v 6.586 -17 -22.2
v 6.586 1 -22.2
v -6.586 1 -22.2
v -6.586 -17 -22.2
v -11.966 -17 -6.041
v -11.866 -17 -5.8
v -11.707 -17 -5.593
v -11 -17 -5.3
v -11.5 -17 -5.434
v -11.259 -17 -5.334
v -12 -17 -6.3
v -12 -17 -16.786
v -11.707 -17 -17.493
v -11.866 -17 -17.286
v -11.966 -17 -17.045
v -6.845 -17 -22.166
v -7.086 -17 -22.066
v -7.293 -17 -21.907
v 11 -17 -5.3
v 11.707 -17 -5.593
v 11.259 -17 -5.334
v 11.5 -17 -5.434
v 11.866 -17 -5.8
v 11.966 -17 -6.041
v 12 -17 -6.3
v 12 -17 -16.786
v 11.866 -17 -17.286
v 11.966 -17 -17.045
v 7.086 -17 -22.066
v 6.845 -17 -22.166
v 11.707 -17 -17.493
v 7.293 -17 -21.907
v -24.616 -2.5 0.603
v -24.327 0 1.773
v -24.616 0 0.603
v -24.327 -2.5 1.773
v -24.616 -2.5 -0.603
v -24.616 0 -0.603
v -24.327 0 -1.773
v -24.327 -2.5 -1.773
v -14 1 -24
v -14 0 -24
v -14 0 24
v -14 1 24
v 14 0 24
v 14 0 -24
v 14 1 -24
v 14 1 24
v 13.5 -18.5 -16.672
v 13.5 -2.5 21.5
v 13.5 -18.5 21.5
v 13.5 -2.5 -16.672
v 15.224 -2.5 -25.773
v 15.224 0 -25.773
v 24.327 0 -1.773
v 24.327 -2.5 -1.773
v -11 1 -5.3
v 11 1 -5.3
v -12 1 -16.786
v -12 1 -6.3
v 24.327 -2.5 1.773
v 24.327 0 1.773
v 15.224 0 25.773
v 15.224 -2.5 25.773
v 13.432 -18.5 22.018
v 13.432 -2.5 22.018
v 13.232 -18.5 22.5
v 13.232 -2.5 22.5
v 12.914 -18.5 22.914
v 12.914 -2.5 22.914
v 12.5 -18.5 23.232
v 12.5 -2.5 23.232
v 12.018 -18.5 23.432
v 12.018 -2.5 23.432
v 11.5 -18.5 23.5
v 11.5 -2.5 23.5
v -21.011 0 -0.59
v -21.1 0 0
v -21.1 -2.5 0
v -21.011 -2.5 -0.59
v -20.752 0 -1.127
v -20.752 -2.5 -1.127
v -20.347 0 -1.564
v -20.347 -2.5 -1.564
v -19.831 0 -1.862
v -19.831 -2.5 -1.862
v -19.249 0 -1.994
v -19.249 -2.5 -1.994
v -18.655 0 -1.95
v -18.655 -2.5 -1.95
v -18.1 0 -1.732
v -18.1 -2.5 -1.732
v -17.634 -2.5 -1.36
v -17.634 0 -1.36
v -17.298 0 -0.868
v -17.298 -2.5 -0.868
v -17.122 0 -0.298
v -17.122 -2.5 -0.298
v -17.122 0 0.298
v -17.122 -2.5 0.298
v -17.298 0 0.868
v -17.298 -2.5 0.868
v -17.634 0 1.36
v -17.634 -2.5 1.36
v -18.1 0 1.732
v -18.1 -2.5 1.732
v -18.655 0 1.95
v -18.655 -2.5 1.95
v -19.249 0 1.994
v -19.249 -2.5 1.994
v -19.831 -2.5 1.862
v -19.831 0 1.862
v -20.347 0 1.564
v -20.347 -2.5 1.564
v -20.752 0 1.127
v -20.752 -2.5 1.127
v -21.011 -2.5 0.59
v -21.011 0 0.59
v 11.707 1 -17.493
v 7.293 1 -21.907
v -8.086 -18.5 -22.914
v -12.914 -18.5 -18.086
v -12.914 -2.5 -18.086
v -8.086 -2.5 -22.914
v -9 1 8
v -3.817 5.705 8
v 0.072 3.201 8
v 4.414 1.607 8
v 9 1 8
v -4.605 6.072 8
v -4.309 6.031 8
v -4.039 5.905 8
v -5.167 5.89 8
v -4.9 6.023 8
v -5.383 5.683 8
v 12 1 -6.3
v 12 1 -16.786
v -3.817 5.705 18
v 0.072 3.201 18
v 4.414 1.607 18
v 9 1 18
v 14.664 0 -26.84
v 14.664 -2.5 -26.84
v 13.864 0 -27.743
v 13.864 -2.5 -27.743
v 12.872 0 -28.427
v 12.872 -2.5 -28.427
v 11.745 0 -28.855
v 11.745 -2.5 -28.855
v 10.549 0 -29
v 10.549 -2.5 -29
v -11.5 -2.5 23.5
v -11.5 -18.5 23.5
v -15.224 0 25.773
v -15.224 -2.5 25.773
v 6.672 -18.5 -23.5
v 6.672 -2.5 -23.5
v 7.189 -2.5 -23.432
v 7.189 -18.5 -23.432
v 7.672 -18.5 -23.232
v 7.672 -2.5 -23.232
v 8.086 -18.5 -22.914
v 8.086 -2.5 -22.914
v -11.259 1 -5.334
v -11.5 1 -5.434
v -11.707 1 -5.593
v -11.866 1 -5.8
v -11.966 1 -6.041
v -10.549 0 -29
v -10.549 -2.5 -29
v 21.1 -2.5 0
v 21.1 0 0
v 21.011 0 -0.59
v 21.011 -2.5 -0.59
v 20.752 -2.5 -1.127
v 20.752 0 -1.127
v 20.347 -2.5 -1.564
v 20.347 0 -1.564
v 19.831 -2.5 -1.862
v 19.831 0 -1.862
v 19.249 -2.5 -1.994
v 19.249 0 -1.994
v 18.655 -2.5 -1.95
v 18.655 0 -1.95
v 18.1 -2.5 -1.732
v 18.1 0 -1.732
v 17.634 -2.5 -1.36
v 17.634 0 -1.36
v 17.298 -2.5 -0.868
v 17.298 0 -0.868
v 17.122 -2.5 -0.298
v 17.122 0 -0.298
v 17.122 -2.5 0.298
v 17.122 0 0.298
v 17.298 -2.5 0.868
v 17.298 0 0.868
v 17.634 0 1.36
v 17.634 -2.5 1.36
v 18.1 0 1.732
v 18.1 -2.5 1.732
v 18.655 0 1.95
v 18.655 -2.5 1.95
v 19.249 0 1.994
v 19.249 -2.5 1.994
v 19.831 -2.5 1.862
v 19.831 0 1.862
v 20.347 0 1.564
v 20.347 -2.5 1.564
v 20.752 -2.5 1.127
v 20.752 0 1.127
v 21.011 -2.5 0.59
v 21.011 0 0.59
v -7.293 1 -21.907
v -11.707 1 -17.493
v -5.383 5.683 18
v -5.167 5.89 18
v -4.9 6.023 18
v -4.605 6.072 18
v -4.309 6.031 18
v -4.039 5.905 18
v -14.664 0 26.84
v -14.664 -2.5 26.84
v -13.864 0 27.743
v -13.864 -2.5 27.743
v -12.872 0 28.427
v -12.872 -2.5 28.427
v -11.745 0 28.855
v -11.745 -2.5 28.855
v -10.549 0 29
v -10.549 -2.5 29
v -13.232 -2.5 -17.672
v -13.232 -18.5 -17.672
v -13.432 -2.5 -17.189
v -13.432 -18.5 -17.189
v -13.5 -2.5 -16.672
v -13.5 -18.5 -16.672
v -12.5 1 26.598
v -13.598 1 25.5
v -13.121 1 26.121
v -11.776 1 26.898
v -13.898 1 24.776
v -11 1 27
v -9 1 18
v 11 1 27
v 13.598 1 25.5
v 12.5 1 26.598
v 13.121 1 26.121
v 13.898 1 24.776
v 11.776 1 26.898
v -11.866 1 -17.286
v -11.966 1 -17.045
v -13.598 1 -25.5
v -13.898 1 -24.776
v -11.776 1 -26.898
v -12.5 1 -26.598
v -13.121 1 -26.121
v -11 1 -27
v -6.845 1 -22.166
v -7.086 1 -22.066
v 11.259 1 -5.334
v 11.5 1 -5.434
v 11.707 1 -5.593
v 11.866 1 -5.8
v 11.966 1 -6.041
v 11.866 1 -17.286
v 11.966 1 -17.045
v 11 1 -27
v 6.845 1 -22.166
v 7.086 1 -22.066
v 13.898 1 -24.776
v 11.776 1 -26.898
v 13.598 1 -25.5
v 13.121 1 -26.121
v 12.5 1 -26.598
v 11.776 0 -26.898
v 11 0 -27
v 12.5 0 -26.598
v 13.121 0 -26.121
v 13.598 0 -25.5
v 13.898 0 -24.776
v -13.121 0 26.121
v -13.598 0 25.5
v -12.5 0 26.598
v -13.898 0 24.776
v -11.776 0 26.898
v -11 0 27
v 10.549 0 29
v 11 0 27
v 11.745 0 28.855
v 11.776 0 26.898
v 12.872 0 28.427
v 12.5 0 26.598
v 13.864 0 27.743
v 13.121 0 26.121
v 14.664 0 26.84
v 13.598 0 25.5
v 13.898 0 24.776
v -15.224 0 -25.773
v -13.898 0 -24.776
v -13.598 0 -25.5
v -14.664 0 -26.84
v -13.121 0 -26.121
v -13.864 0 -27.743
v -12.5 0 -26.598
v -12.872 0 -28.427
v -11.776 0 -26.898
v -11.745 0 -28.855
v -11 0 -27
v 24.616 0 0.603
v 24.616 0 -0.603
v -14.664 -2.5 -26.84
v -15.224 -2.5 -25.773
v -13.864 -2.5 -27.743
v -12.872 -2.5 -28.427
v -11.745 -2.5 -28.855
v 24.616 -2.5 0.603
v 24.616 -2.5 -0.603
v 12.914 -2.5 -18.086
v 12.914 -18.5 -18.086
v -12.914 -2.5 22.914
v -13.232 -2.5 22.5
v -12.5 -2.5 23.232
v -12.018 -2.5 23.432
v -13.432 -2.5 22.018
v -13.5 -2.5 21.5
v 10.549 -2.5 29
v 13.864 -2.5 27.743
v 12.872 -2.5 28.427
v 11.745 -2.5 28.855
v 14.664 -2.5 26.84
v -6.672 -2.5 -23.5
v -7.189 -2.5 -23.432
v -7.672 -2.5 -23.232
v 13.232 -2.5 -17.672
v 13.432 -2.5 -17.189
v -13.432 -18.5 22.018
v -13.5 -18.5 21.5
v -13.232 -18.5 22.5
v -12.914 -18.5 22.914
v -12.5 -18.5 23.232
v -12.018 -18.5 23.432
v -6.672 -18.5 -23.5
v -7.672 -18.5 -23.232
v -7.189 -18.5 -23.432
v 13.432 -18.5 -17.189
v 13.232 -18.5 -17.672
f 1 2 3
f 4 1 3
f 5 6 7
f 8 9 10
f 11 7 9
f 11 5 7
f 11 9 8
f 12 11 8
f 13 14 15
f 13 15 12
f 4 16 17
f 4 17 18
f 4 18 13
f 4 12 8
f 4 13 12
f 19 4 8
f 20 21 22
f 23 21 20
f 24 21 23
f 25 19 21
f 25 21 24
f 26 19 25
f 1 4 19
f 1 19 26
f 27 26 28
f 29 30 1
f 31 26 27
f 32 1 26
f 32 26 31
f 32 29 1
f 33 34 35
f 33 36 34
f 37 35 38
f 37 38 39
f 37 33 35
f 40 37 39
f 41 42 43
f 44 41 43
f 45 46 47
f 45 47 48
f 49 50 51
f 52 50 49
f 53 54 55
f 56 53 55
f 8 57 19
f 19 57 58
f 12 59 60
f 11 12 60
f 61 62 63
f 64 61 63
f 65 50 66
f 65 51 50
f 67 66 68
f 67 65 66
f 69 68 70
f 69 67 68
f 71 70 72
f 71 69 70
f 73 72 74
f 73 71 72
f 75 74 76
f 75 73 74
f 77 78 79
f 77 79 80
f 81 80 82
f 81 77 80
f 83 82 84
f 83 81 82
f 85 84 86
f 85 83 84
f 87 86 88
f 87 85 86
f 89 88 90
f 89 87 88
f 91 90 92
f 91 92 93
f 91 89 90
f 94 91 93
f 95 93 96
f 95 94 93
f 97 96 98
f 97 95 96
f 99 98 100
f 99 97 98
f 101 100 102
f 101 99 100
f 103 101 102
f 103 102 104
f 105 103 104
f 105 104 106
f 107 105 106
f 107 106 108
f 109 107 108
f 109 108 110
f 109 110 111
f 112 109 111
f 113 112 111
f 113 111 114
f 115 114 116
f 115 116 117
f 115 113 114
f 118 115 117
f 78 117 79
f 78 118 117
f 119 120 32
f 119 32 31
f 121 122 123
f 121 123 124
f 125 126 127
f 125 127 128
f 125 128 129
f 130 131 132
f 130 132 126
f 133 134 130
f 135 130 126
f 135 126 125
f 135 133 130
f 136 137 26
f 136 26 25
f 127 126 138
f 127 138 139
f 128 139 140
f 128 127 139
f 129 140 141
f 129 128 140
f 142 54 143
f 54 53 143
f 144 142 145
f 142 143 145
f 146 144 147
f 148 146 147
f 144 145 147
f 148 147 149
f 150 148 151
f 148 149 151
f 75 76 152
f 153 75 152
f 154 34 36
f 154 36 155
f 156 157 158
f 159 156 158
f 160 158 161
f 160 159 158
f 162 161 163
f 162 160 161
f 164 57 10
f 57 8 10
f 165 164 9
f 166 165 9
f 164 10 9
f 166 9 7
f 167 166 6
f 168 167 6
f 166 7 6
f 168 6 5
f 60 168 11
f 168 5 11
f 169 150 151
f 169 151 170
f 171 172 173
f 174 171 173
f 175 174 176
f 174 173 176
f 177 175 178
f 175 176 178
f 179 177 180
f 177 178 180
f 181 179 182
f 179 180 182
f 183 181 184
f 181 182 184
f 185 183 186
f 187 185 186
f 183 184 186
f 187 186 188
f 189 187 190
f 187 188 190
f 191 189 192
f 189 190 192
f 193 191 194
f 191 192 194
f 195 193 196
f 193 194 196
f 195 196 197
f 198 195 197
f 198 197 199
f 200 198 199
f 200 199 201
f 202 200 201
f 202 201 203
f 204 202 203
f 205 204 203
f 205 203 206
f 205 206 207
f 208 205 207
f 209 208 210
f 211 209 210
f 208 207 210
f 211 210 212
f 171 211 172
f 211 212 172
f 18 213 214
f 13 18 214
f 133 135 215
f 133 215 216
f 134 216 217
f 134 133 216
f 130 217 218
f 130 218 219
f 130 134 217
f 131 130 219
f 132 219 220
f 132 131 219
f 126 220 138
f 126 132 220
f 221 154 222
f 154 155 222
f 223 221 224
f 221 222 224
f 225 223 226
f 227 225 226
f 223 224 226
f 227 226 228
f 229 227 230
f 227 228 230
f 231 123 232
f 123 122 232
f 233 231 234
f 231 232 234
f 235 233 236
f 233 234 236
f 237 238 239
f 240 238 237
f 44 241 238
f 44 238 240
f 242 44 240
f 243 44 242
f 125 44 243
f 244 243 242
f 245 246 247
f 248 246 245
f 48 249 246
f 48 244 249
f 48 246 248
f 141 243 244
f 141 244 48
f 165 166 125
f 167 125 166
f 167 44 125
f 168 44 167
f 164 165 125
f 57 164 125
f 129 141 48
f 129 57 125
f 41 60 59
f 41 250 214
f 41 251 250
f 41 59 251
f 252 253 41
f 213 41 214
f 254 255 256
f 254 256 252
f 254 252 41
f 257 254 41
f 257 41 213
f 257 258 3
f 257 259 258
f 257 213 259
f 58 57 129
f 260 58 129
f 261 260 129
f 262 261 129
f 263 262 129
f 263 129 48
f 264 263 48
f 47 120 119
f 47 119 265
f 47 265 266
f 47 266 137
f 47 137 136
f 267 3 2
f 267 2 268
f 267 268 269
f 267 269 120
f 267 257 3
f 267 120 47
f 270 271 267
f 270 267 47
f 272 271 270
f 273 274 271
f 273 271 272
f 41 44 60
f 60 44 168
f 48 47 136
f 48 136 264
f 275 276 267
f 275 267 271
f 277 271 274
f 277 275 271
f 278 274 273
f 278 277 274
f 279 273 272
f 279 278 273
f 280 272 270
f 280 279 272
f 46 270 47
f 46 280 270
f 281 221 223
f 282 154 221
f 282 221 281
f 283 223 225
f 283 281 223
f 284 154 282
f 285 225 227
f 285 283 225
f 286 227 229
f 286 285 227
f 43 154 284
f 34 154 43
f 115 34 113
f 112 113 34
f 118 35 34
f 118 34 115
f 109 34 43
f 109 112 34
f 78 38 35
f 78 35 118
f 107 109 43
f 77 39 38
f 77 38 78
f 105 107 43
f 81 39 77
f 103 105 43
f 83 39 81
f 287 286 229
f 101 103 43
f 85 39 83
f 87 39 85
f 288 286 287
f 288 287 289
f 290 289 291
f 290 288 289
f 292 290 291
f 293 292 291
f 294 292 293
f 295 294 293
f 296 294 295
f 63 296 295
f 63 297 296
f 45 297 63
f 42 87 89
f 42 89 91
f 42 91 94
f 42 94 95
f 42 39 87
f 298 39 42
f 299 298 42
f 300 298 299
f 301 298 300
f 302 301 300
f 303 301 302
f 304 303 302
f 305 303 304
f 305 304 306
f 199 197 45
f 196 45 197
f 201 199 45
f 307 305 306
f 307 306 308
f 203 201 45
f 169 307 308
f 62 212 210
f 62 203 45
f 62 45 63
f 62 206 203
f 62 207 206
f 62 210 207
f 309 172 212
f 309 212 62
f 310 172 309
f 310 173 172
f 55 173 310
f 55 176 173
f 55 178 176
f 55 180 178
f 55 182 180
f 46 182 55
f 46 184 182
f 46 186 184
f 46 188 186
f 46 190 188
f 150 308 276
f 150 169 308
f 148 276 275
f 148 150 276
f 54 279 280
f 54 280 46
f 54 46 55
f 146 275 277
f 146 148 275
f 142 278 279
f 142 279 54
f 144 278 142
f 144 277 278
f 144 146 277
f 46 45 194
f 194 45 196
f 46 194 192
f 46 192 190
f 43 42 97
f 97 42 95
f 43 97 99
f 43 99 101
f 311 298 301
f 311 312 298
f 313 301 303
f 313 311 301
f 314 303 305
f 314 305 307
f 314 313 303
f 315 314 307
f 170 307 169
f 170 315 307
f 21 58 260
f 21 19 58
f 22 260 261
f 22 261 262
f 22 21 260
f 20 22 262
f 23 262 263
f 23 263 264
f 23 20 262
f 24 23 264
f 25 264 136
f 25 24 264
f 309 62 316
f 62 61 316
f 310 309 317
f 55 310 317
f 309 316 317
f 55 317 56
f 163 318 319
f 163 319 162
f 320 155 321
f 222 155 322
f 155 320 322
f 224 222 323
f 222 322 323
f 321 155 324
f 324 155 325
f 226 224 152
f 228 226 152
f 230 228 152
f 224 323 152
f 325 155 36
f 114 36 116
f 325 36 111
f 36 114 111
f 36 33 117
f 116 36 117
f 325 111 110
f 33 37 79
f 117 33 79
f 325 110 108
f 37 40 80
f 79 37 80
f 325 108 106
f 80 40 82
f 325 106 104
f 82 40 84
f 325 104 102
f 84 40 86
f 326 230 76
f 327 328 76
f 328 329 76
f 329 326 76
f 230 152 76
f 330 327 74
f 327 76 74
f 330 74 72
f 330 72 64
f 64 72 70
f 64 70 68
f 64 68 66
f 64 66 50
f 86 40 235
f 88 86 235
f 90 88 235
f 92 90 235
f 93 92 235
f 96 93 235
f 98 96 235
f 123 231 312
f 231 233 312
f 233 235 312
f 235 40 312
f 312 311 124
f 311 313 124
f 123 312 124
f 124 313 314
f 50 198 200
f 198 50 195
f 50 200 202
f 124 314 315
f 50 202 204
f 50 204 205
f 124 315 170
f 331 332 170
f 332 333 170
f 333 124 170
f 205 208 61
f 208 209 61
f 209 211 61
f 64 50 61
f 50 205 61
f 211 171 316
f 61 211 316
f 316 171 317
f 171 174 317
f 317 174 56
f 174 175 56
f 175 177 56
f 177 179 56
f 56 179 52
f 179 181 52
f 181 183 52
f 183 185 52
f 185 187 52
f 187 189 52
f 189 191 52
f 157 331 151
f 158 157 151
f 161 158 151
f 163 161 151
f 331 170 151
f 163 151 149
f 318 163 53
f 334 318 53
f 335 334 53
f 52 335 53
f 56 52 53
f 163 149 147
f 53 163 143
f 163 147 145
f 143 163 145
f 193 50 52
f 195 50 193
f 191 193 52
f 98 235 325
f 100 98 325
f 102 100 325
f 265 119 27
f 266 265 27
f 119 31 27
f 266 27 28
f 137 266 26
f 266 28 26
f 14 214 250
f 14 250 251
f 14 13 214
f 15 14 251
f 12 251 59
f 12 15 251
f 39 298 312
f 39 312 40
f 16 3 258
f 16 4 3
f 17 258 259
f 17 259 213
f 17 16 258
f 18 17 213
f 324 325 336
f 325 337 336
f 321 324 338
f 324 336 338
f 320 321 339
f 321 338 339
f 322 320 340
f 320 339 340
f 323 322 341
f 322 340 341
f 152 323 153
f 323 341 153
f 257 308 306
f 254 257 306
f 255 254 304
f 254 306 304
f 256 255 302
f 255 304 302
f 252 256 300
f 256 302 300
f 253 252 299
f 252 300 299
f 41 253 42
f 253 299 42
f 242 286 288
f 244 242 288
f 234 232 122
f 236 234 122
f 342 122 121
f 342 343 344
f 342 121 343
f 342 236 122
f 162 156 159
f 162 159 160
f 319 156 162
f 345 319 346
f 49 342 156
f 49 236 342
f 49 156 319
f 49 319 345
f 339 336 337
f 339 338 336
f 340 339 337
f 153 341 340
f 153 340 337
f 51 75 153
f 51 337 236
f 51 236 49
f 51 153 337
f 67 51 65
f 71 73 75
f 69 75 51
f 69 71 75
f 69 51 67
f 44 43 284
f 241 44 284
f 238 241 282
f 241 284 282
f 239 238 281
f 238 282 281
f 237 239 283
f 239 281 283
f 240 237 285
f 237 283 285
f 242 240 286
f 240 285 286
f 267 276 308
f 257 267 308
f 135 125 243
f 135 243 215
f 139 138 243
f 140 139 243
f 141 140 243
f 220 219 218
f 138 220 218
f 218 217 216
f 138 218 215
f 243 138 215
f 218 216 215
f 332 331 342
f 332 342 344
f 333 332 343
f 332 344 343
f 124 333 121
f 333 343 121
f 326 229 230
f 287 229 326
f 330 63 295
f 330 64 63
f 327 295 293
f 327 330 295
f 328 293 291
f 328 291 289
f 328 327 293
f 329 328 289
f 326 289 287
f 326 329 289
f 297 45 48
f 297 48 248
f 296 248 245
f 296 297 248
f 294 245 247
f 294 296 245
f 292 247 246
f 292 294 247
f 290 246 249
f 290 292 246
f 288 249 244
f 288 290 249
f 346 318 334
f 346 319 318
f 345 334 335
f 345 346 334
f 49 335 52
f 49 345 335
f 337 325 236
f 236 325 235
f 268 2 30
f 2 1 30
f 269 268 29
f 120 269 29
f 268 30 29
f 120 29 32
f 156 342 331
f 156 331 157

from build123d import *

# Parameters (mm, degrees)
SKETCH1_R           = 2
BOSS_EXTRUDE1_DEPTH = 2.5
FILLET1_R           = 5
BOSS_EXTRUDE2_DEPTH = 1
BOSS_EXTRUDE3_DEPTH = 16
FILLET2_R           = 2
CUT_EXTRUDE1_DEPTH  = 18
FILLET3_R           = 1
BOSS_EXTRUDE4_START = 8
BOSS_EXTRUDE4_DEPTH = 10


with BuildPart() as part:
    # Sketch1 → Boss-Extrude1 (new body)
    with BuildSketch(Plane(origin=(0, 0, 0), x_dir=(1, 0, 0), z_dir=(0, 1, 0))):
        Polygon((25, 0), (14, -29), (0, -29), (0, 29), (14, 29), align=None)
        with Locations((19.1, 0)):
            Circle(SKETCH1_R, mode=Mode.SUBTRACT)
    extrude(amount=-BOSS_EXTRUDE1_DEPTH)

    # Fillet1
    fillet1_edges = [part.edges().sort_by_distance(p)[0] for p in [
        (14, -1.25, -29),
        (25, -1.25, 0),
        (14, -1.25, 29),
    ]]
    fillet(fillet1_edges, radius=FILLET1_R)

    # Sketch2 → Boss-Extrude2 (add)
    with BuildSketch(Plane(origin=(0, 0, 0), x_dir=(1, 0, 0), z_dir=(0, 1, 0))):
        with BuildLine():
            Line((0, 27), (11, 27))
            ThreePointArc((11, 27), (13.121320344, 26.121320344), (14, 24))
            Line((14, 24), (14, -24))
            ThreePointArc((14, -24), (13.121320344, -26.121320344), (11, -27))
            Line((11, -27), (0, -27))
            Line((0, -27), (0, 27))
        make_face()
    extrude(amount=BOSS_EXTRUDE2_DEPTH)

    # Sketch3 → Boss-Extrude3 (add)
    with BuildSketch(Plane.XZ.offset(2.5)):
        Polygon((0, 23.5), (13.5, 23.5), (13.5, -17.5), (7.5, -23.5), (0, -23.5), align=None)
    extrude(amount=BOSS_EXTRUDE3_DEPTH)

    # Fillet2
    fillet2_edges = [part.edges().sort_by_distance(p)[0] for p in [
        (13.5, -10.5, -17.5),
        (7.5, -10.5, -23.5),
        (13.5, -10.5, 23.5),
    ]]
    fillet(fillet2_edges, radius=FILLET2_R)

    # Sketch5 → Cut-Extrude1 (cut)
    with BuildSketch(Plane(origin=(0, 1, 0), x_dir=(1, 0, 0), z_dir=(0, 1, 0))):
        Polygon((0, 22.2), (7, 22.2), (12, 17.2), (12, 5.3), (0, 5.3), align=None)
    extrude(amount=-CUT_EXTRUDE1_DEPTH, mode=Mode.SUBTRACT)

    # Fillet3
    fillet3_edges = [part.edges().sort_by_distance(p)[0] for p in [
        (7, -8, -22.2),
        (12, -8, -17.2),
        (12, -8, -5.3),
    ]]
    fillet(fillet3_edges, radius=FILLET3_R)

    # Mirror1: part across plane


with BuildPart() as part_1:
    add(part.part)
    add(part.part.mirror(Plane(origin=(0, -2.5, -29), x_dir=(0, 0, 1), z_dir=(-1, 0, 0))))

    # Sketch6 → Boss-Extrude4 (add)
    with BuildSketch(Plane.XY.offset(BOSS_EXTRUDE4_START)):
        with BuildLine():
            Line((-9, 1), (-5.383132121, 5.683158511))
            ThreePointArc((-5.383132121, 5.683158511), (-4.605403481, 6.071821883), (-3.817307634, 5.704635295))
            ThreePointArc((-3.817307634, 5.704635295), (2.199237296, 2.28405626), (9, 1))
            Line((9, 1), (-9, 1))
        make_face()
    extrude(amount=BOSS_EXTRUDE4_DEPTH)


solid = part_1.part
